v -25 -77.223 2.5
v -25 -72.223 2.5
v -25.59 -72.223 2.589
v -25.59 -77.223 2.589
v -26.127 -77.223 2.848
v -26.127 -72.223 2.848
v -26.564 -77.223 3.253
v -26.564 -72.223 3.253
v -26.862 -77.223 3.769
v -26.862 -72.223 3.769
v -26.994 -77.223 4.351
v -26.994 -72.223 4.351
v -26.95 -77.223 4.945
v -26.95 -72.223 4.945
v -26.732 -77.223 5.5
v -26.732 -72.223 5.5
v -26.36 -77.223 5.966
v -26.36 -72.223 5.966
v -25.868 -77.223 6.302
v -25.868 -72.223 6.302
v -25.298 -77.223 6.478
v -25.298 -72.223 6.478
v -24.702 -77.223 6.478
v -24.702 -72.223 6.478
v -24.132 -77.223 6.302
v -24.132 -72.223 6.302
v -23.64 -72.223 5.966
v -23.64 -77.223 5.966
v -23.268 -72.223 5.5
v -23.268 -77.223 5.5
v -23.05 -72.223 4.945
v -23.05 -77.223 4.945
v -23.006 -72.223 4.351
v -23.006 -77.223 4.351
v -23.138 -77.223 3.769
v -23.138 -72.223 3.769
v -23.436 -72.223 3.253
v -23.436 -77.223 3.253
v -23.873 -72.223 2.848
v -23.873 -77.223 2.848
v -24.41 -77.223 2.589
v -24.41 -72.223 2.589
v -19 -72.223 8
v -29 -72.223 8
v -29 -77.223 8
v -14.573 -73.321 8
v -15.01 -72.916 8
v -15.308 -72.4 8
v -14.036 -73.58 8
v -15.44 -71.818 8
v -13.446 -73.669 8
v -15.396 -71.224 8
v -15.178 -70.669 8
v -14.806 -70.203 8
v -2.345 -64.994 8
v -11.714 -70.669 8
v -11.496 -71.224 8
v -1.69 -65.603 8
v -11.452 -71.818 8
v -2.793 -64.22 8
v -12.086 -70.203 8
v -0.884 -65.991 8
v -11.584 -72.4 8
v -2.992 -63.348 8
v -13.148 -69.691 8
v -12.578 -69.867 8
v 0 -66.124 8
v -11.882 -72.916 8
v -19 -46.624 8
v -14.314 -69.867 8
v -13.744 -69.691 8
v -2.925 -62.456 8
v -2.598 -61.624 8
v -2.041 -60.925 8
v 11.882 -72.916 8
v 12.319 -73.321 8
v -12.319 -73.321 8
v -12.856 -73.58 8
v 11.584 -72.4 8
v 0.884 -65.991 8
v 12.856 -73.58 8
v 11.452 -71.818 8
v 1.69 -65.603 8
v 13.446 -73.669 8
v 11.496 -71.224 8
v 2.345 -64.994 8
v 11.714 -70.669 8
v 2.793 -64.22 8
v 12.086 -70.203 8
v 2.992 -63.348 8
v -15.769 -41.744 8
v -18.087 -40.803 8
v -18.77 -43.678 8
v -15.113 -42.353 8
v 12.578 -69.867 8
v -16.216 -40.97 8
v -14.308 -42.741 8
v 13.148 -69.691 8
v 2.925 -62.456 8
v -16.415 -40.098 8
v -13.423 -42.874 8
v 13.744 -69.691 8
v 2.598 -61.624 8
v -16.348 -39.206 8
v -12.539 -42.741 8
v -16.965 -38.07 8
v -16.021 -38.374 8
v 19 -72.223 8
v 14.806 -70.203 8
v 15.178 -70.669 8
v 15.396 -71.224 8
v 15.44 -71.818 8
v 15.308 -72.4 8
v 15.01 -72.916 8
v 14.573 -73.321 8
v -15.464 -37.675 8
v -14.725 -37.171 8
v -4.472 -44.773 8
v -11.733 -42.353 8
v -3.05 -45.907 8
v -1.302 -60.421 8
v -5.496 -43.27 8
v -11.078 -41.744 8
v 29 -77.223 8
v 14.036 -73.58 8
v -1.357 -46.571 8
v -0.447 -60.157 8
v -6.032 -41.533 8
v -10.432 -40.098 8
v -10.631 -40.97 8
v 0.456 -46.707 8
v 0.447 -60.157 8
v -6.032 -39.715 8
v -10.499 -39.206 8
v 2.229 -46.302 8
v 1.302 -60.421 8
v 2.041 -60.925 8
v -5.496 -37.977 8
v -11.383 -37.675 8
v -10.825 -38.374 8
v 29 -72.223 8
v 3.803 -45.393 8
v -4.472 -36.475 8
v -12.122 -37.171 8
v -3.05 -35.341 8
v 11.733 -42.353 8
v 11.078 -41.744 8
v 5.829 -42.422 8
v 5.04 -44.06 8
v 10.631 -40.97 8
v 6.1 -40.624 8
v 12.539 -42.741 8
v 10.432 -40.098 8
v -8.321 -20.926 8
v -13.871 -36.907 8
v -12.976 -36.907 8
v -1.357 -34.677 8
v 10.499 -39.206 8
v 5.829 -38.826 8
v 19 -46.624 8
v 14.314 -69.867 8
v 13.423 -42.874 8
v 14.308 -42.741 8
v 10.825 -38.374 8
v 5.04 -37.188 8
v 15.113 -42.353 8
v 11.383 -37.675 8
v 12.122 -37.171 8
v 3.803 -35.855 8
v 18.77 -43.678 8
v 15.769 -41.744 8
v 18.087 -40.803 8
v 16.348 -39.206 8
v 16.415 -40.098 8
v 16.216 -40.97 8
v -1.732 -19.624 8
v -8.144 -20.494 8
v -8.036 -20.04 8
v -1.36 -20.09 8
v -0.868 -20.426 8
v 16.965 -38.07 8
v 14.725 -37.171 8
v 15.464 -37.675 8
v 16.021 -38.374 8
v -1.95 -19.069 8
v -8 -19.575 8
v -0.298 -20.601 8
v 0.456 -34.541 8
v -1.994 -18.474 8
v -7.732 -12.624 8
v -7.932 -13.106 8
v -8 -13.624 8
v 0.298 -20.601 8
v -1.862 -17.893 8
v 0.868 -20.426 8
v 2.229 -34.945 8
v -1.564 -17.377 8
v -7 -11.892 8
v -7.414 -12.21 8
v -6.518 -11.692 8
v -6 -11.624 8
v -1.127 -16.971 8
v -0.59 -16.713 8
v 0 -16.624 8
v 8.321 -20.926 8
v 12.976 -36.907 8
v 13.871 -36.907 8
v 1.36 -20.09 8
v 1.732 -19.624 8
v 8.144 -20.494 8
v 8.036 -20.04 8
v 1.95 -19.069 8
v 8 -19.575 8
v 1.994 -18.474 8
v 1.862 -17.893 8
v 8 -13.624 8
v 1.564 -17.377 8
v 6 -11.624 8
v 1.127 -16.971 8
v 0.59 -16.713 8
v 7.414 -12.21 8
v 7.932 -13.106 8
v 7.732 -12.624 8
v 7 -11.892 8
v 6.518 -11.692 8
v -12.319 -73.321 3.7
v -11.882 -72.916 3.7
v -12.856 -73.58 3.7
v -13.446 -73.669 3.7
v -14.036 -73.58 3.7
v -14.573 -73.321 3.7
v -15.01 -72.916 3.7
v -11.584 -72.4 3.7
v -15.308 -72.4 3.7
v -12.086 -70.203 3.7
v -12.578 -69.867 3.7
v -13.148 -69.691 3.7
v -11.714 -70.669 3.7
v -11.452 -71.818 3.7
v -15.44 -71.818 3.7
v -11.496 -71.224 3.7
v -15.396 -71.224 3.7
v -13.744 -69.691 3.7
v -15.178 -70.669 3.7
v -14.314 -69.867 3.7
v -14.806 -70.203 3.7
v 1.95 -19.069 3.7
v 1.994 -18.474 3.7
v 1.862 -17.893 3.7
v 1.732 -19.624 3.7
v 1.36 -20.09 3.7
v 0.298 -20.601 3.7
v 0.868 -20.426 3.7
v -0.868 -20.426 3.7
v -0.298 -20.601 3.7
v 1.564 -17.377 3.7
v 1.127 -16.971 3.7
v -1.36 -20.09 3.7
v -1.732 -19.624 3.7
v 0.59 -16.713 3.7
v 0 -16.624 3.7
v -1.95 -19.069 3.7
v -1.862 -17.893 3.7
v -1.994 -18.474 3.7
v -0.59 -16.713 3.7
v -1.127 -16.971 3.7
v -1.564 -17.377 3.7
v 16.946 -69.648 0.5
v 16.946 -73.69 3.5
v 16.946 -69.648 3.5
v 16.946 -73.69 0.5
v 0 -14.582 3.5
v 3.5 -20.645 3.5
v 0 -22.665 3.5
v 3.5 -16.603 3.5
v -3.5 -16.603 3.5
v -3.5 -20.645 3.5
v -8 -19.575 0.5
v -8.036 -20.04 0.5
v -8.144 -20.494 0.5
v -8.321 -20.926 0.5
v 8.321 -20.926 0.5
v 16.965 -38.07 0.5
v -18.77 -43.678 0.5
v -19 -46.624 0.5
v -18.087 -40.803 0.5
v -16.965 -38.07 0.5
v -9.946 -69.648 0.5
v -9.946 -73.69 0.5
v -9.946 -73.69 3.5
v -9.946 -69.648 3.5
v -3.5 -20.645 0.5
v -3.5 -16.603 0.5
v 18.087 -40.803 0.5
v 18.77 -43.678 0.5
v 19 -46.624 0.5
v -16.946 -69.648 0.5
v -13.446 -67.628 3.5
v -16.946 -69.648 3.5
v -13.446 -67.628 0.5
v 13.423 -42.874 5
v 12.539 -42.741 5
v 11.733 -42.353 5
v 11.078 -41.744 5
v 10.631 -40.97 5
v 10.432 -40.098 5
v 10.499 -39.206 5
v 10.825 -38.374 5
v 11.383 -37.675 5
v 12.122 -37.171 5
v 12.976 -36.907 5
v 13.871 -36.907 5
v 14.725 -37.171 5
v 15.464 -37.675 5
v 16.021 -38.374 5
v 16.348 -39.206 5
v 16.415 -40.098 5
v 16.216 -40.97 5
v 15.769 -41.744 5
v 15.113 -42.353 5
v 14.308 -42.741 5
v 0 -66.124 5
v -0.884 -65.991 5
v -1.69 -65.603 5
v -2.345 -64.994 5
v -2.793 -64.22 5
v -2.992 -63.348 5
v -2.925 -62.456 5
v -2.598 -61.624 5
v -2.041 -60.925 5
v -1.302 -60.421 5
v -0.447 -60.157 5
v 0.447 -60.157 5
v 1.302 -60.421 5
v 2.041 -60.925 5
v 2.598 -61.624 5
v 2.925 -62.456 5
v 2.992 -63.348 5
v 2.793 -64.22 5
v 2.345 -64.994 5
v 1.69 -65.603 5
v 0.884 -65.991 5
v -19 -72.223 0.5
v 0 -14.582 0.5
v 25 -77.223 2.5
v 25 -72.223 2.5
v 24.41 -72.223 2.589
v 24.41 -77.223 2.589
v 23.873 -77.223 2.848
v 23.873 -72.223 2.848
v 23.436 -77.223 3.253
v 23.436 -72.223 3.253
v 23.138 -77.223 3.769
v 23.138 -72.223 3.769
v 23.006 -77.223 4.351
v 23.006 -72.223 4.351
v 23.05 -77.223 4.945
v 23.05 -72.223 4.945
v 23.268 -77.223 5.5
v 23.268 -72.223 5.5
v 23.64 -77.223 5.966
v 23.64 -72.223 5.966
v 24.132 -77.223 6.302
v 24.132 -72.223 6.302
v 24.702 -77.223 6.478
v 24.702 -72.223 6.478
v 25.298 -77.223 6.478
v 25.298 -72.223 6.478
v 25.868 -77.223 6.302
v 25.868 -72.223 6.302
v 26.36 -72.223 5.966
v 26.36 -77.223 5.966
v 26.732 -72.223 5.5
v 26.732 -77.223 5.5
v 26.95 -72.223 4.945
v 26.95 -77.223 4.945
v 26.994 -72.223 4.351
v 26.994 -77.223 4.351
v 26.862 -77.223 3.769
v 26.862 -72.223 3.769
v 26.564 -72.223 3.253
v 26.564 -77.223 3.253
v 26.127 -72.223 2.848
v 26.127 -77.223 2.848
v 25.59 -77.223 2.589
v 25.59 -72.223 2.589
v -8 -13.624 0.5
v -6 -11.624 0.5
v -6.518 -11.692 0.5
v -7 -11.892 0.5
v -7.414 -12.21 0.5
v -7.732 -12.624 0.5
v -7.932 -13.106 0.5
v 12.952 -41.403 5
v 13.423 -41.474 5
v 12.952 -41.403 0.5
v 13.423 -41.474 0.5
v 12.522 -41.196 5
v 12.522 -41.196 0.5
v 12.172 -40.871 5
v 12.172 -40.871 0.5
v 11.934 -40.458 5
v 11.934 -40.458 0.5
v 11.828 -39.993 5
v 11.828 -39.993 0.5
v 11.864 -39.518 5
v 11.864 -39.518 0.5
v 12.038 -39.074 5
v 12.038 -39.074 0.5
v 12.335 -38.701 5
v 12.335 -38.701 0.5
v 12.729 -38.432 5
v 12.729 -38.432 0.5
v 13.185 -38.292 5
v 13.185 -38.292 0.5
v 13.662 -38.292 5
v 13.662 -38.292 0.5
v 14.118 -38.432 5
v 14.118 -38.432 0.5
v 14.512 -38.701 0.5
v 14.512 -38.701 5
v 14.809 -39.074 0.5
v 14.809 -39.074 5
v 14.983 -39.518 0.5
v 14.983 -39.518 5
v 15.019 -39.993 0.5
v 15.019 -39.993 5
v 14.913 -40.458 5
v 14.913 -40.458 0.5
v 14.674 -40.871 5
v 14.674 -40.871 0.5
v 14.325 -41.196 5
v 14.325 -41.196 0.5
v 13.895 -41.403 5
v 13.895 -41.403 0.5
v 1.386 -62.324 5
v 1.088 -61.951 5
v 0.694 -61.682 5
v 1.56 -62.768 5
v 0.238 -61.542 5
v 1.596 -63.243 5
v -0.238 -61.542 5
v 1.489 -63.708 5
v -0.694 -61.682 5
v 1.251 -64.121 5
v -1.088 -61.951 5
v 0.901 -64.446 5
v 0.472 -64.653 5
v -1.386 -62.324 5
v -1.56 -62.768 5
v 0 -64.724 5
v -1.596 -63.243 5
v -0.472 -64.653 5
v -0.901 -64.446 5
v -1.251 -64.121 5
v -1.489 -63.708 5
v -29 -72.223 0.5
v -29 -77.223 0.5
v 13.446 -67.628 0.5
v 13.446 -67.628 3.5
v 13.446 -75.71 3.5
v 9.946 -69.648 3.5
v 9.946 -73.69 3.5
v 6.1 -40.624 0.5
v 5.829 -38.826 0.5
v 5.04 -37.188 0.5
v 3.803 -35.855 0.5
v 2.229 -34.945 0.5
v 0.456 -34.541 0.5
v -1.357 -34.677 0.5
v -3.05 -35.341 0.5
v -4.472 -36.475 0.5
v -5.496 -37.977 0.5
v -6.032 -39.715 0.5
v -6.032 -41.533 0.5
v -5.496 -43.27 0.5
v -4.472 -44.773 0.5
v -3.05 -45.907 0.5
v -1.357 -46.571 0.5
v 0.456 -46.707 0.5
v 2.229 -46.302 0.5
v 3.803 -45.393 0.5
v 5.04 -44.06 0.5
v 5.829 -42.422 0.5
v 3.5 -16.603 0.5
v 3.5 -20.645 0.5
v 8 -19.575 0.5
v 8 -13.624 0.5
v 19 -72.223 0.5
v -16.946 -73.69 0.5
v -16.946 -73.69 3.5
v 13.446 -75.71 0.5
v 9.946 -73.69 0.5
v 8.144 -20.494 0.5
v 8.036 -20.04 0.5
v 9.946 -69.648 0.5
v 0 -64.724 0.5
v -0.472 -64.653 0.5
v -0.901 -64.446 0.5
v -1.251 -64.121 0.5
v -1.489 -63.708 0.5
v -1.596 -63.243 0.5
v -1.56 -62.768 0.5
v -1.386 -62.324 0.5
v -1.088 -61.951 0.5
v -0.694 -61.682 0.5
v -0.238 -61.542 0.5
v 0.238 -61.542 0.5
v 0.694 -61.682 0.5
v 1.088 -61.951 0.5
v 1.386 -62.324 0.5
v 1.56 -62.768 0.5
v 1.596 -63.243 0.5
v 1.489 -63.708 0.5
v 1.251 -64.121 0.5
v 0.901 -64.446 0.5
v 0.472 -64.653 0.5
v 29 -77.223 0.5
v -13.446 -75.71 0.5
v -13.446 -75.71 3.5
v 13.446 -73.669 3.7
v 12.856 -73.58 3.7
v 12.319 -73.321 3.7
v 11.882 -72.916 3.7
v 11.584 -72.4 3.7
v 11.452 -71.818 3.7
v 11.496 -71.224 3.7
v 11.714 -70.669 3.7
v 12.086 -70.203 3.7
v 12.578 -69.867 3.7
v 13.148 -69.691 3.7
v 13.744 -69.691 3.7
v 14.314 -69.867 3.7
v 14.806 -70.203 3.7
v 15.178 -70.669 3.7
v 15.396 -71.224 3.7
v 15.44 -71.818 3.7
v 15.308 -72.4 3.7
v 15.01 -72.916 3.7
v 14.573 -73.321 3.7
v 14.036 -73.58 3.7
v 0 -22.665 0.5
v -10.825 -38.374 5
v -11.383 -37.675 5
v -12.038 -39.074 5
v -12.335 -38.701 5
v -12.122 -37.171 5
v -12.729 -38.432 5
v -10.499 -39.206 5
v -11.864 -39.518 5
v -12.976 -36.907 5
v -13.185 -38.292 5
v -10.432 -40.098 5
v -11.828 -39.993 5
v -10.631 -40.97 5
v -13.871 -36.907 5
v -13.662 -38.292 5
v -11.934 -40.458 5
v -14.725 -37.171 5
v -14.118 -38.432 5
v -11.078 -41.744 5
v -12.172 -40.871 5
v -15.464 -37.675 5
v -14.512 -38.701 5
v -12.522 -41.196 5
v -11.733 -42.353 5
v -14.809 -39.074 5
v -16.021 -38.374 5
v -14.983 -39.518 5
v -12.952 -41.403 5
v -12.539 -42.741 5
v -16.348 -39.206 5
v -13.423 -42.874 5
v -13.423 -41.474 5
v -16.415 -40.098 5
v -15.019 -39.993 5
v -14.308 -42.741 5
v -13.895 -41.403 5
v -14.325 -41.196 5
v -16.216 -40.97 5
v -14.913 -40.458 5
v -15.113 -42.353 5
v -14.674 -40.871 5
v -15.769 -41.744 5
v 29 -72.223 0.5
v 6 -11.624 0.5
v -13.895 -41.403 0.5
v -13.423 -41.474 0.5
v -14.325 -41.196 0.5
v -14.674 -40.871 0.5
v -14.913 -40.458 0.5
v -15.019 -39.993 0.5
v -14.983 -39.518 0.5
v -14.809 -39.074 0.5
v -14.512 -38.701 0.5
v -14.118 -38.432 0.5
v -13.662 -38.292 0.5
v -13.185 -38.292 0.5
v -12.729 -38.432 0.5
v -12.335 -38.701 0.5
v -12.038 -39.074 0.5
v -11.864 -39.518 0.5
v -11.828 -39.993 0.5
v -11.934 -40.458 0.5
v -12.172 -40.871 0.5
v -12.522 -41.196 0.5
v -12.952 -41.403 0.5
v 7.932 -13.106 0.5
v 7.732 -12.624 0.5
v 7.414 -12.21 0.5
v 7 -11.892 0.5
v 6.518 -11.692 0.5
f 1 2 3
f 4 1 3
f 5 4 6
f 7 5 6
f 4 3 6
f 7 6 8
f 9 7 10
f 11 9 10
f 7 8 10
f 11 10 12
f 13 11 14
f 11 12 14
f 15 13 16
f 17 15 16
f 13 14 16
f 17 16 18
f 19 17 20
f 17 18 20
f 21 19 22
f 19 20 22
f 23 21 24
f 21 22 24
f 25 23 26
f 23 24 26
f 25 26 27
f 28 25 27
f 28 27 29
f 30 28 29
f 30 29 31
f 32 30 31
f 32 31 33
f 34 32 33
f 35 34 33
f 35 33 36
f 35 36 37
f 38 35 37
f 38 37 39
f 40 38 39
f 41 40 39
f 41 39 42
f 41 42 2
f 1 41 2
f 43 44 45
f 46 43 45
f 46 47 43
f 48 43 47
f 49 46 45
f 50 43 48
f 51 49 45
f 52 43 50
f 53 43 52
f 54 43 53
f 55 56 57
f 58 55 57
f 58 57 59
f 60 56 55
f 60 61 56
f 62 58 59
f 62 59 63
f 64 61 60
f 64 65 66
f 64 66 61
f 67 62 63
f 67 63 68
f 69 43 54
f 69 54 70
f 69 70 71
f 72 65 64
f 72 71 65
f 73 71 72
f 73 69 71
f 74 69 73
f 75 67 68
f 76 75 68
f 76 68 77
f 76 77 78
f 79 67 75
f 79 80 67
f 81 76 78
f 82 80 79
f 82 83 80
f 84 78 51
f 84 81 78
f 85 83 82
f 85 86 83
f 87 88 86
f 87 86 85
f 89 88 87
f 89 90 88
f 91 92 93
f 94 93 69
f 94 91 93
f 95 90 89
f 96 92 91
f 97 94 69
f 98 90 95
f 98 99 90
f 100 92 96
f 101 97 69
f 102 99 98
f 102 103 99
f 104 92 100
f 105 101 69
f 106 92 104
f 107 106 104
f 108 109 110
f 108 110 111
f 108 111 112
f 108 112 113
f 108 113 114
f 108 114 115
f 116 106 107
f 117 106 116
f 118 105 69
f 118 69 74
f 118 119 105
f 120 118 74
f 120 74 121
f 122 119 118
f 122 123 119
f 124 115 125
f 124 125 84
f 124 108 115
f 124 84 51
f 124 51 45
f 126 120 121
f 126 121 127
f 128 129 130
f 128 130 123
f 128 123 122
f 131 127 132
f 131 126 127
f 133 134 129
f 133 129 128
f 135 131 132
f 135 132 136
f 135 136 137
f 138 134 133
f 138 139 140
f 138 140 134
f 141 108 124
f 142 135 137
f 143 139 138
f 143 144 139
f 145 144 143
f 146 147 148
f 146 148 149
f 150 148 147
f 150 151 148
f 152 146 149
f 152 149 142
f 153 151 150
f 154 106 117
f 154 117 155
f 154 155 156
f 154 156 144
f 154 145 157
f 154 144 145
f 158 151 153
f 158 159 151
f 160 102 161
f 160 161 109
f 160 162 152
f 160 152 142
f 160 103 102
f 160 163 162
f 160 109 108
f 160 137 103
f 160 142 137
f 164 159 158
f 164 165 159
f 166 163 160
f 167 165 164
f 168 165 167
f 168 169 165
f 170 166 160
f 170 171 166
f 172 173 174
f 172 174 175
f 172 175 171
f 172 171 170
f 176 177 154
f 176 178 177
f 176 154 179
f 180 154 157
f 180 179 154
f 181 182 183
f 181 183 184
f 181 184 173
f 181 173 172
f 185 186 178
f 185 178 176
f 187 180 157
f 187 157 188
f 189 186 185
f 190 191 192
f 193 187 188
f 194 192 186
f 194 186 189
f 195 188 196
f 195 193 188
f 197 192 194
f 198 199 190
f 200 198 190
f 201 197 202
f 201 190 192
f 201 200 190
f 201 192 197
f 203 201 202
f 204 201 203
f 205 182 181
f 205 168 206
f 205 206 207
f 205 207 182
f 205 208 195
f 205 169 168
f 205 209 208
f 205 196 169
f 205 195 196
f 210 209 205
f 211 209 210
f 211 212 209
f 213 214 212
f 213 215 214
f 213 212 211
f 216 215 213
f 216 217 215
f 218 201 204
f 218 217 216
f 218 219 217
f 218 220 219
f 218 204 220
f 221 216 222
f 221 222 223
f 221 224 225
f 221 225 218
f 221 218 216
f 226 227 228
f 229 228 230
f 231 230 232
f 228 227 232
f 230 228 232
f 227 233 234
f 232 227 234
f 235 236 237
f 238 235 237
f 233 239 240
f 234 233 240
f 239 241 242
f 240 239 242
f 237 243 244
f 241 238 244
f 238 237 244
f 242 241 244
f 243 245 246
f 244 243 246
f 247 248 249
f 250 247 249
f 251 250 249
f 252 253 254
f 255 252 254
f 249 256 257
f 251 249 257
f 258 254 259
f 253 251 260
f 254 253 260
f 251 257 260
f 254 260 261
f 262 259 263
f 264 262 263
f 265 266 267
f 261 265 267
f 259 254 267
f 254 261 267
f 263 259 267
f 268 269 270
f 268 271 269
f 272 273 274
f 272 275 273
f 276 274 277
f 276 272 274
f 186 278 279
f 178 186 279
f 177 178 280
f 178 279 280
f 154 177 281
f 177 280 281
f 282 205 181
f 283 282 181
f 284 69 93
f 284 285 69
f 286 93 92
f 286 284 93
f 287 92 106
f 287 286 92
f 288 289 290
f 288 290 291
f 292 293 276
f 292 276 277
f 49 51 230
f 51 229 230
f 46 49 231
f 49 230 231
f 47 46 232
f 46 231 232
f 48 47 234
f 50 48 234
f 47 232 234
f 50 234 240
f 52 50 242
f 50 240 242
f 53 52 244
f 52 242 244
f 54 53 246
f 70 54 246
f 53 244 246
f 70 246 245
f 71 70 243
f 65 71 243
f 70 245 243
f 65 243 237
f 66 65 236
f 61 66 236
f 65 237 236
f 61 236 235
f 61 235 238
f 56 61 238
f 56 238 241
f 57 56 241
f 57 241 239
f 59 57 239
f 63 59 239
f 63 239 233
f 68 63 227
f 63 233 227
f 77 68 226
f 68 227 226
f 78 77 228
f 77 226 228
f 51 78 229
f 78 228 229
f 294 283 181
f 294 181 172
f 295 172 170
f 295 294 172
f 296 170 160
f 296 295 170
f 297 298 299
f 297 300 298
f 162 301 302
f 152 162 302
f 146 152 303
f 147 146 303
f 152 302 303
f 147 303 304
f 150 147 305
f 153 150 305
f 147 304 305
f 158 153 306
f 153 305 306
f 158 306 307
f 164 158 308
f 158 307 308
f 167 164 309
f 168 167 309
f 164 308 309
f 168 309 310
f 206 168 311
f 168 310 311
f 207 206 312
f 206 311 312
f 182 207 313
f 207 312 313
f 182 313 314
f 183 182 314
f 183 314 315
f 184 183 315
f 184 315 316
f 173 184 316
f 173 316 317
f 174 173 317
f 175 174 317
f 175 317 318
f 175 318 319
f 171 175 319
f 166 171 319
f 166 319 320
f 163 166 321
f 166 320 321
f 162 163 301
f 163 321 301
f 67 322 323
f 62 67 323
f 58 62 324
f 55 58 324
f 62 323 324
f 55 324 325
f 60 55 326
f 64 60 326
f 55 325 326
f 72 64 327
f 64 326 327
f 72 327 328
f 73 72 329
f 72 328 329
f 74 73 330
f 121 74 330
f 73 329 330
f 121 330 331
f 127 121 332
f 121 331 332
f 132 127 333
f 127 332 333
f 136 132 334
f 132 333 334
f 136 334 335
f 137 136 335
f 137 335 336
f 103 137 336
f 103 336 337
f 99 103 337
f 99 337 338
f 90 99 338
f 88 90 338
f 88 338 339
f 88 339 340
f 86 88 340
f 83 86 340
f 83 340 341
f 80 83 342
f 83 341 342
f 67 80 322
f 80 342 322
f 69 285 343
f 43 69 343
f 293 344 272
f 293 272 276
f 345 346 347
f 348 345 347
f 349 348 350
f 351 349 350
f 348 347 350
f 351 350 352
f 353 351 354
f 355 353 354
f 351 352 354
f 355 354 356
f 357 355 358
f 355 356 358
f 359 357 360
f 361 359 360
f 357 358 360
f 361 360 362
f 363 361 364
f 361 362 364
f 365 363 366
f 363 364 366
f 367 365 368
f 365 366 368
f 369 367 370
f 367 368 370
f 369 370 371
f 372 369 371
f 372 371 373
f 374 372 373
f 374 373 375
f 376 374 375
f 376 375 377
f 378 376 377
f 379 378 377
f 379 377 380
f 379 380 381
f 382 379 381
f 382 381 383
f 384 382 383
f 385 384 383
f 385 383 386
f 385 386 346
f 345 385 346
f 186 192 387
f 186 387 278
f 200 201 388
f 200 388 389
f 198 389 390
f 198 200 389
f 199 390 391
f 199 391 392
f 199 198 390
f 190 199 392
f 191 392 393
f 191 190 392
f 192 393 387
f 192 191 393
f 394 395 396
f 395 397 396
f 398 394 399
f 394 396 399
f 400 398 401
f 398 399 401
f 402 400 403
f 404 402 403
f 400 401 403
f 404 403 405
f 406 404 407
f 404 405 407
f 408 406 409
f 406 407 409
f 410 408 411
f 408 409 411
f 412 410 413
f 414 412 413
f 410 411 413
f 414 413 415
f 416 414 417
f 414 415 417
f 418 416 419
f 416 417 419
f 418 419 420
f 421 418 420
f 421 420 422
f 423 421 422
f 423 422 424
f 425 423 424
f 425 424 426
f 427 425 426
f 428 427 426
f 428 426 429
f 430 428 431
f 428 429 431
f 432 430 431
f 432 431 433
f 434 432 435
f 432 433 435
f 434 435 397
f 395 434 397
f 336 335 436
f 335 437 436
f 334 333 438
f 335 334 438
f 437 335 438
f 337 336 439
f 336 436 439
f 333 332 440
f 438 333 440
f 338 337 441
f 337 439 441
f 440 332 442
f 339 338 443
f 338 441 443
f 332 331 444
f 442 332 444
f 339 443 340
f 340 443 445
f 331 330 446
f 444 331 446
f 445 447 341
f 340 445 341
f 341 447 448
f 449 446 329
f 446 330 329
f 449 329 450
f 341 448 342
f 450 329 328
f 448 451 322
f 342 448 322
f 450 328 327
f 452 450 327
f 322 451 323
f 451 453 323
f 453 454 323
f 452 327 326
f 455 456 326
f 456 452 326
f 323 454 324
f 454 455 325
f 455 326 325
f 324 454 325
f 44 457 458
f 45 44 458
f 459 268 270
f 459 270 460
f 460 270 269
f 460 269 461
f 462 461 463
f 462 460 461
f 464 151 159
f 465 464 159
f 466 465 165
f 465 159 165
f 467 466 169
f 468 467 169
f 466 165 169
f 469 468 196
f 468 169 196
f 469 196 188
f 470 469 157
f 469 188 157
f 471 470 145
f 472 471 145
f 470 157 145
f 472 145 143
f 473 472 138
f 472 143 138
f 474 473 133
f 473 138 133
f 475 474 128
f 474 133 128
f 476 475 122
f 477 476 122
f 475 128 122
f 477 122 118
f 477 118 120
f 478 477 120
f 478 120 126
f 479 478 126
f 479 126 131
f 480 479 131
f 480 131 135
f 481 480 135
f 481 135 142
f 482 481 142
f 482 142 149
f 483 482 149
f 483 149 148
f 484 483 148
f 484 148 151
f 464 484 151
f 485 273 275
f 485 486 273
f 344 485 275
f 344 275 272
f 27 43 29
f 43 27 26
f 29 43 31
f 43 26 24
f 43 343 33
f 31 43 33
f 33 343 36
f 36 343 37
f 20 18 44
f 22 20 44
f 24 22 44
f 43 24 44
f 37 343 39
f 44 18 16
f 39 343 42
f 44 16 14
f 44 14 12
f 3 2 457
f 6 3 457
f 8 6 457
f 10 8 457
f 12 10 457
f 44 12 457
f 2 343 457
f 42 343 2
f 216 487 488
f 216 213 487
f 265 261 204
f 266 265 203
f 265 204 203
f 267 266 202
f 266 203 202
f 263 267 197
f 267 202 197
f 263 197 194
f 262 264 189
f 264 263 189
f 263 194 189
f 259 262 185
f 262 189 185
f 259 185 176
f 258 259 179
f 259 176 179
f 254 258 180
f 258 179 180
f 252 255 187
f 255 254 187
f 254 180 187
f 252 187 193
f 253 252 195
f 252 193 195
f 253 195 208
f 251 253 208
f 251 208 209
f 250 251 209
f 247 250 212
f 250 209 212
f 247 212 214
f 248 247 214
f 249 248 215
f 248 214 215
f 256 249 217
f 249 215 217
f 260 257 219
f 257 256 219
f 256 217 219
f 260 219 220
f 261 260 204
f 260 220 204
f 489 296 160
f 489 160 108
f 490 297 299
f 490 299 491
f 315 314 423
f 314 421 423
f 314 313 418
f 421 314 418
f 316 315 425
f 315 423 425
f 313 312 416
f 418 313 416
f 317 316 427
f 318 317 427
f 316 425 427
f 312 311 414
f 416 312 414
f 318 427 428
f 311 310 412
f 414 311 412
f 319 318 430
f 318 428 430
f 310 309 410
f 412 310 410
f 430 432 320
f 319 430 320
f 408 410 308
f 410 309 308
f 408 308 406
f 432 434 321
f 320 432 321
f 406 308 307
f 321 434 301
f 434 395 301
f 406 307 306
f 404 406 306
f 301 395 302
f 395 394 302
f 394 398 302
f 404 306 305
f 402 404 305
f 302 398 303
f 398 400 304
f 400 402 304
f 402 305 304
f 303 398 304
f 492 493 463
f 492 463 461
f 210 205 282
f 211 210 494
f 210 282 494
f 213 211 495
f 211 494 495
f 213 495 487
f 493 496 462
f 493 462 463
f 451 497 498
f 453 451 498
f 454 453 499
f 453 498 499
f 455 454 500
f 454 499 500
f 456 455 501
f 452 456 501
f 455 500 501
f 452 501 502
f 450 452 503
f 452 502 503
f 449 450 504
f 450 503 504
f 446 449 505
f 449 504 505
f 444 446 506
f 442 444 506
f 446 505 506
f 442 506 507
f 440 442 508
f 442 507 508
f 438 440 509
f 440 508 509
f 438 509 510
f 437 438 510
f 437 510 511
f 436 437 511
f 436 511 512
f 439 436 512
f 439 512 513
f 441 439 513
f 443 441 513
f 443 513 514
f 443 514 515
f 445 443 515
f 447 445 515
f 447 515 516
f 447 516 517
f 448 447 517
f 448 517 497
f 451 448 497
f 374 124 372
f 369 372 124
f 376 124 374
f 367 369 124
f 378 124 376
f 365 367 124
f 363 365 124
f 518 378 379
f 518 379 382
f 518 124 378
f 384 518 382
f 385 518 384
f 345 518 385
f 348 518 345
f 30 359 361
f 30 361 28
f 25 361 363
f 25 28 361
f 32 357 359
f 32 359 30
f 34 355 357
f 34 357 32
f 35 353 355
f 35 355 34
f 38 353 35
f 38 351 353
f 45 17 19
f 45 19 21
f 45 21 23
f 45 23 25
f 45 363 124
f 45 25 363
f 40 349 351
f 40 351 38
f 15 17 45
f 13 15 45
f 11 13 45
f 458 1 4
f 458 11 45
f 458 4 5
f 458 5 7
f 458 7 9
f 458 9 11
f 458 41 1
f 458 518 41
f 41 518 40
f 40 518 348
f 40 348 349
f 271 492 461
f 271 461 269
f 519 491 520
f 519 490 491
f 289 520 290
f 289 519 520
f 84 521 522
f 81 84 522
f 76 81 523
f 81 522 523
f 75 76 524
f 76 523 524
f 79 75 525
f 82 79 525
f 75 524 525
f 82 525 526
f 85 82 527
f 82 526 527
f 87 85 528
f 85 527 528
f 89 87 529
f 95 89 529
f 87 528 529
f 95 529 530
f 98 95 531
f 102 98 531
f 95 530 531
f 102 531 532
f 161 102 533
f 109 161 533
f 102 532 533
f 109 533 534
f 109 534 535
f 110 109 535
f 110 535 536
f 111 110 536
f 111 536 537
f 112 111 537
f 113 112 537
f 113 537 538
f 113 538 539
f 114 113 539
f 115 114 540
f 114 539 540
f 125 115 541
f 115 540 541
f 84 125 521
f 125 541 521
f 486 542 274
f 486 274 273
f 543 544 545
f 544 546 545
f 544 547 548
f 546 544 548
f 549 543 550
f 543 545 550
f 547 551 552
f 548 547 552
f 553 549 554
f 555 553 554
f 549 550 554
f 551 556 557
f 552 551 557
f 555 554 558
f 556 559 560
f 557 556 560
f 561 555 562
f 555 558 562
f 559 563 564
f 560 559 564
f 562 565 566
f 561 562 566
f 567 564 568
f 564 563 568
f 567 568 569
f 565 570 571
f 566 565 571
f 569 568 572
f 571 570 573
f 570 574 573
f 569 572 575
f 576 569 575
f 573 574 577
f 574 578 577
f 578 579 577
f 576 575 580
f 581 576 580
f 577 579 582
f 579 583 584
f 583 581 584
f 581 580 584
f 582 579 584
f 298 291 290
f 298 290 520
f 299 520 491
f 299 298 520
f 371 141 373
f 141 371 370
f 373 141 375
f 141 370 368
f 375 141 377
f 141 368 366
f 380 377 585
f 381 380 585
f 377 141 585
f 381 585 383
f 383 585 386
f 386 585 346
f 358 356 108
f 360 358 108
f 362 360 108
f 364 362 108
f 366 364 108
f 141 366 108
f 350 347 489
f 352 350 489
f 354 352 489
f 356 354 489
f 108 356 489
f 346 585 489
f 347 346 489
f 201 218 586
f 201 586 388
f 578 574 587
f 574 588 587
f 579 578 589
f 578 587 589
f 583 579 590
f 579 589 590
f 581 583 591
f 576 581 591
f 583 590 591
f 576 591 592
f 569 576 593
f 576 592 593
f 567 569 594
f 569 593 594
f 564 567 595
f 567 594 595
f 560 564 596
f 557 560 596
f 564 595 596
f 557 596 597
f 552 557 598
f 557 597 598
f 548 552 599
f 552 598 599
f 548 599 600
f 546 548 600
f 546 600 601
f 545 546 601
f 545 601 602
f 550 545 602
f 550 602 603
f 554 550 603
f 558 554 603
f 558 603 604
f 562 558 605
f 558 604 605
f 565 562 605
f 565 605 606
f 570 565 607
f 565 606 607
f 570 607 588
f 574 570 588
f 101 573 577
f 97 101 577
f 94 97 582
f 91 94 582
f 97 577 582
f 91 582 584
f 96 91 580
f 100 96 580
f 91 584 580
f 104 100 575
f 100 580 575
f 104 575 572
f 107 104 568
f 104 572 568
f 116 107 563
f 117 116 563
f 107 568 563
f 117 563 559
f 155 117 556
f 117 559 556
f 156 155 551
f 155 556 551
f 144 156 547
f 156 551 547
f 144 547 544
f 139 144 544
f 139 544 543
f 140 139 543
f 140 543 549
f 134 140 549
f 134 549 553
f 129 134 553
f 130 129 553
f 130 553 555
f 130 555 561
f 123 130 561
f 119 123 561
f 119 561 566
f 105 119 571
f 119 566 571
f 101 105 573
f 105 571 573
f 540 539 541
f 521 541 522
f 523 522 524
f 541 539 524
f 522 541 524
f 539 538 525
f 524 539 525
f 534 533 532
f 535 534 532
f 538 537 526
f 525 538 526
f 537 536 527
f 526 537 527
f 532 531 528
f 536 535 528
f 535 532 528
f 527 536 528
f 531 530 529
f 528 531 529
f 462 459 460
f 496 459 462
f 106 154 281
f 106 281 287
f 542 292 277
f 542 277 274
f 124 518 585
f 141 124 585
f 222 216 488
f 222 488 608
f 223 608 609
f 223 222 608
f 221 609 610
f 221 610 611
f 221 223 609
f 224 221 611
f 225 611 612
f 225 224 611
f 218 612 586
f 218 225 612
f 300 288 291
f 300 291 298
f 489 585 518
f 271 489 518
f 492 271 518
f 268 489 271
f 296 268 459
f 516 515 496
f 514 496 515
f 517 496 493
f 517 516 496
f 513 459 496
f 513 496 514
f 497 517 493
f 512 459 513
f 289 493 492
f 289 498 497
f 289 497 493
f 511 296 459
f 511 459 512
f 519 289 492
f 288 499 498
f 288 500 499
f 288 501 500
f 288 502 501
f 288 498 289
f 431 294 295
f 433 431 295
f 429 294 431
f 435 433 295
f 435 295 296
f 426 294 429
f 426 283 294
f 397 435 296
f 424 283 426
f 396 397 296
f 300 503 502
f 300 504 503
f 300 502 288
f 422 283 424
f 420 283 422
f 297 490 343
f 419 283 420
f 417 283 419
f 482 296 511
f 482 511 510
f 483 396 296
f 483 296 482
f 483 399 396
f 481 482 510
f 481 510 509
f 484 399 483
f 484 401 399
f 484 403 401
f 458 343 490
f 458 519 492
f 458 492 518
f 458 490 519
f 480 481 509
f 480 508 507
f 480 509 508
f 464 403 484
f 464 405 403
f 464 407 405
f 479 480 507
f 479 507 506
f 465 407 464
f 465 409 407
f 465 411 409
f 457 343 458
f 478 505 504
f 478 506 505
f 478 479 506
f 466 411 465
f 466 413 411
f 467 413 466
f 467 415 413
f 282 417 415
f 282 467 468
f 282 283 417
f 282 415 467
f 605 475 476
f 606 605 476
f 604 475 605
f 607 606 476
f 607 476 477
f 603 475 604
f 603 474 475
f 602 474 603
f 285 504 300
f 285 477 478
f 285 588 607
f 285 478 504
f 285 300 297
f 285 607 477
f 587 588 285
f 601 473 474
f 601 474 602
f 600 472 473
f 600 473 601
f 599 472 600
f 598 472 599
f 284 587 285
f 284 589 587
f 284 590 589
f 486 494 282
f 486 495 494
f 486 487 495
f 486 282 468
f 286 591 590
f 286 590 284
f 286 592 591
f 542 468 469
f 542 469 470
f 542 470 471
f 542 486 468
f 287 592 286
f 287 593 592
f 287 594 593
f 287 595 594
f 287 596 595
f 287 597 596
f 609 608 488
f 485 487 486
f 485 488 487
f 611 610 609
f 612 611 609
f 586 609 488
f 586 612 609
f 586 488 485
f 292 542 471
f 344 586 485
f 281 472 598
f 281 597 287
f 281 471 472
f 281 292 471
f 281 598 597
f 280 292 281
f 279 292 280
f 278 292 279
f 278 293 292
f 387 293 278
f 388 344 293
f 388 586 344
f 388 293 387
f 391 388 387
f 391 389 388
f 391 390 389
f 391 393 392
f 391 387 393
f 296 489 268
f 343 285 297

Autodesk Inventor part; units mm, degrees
ref_plane "YZ Plane" through (0, 0, 0) normal (1, 0, 0) x (0, 1, 0)
ref_plane "XZ Plane" through (0, 0, 0) normal (0, 1, 0) x (-1, 0, 0)
ref_plane "XY Plane" through (0, 0, 0) normal (0, 0, 1) x (1, 0, 0)
sketch "Skizze1" plane through (0, 0, 0) normal (0, 0, 1) x (1, 0, 0)
  arc A0 (-19, -51.1238) -> (19, -51.1238) centre (0, -51.1238) ccw projected
  line L0 (-19, -72.2231) -> (-19, -51.1238) projected
  line L1 (-19, -72.2231) -> (-29, -72.2231) projected
  line L2 (-29, -72.2231) -> (-29, -77.2231) projected
  line L3 (29, -77.2231) -> (-29, -77.2231) projected
  line L4 (29, -77.2231) -> (29, -72.2231) projected
  line L5 (29, -72.2231) -> (19, -72.2231) projected
  line L6 (19, -72.2231) -> (19, -51.1238) projected
  circle A1 centre (0, -47.6238) radius 17.5 projected
  circle A2 centre (0, -40.6238) radius 6 projected
  arc A3 (19, -46.6238) -> (-19, -46.6238) centre (0, -46.6238) ccw
  line L7 (-19, -46.6238) -> (-19, -51.1238)
  line L8 (19, -46.6238) -> (19, -51.1238)
  circle A4 centre (-13.446, -71.669) radius 2.1 projected
  circle A5 centre (13.446, -71.669) radius 2.1 projected
  point P0 (0, 0)
extrude "Extrusion1" add sketch "Skizze1" along normal blind 8 contours L7 A3 L8 A0 | A0 L6 L5 L4 L3 L2 L1 L0 | A1 | A4 | A5
sketch "Skizze2" plane through (-29, -77.2231, 0) normal (0, -1, 0) x (1, 0, 0)
  circle A0 centre (4, 4.5) radius 2.35 projected
  circle A1 centre (54, 4.5) radius 2.35 projected
  point P0 (29, 0)
hole "Bohrung1" at (-25, -77.2231, 4.5) at (25, -77.2231, 4.5) direction (0, 1, 0) diameter 4 end through all
sketch "Skizze3" plane through (0, 0, 0) normal (0, 0, -1) x (-1, 0, 0)
  circle A0 centre (0, -40.6238) radius 6 projected
  line L0 (-19, -72.2231) -> (-19, -46.6238) projected
  line L1 (-29, -72.2231) -> (-19, -72.2231) projected
  line L2 (-29, -77.2231) -> (-29, -72.2231) projected
  line L3 (29, -77.2231) -> (-29, -77.2231) projected
  line L4 (29, -72.2231) -> (29, -77.2231) projected
  line L5 (19, -72.2231) -> (29, -72.2231) projected
  line L6 (19, -46.6238) -> (19, -72.2231) projected
  arc A1 (19, -46.6238) -> (-19, -46.6238) centre (0, -46.6238) ccw projected
  point P0 (0, 0)
extrude "Extrusion2" cut sketch "Skizze3" against normal blind 0.5
sketch "Skizze4" plane through (0, 0, 8) normal (0, 0, 1) x (1, 0, 0)
  circle A0 centre (-13.446, -71.669) radius 2.1 projected
  circle A1 centre (13.446, -71.669) radius 2.1 projected
  point P0 (0, 0)
hole "Bohrung2" at (-13.446, -71.669, 8) at (13.446, -71.669, 8) direction (0, 0, -1) diameter 4 end through all
sketch "Skizze5" plane through (0, 0, 0.5) normal (0, 0, -1) x (-1, 0, 0)
  circle A0 centre (13.446, -71.669) radius 2 projected
  circle A1 centre (-13.446, -71.669) radius 2 projected
  line L0 (-19, -72.2231) -> (-19, -46.6238) projected
  line L1 (19, -46.6238) -> (19, -72.2231) projected
  line L2 (-13.446, -67.6276) -> (-9.946, -69.6483)
  line L3 (-9.946, -69.6483) -> (-9.946, -73.6898)
  line L4 (-9.946, -73.6898) -> (-13.446, -75.7105)
  line L5 (-13.446, -75.7105) -> (-16.946, -73.6898)
  line L6 (-16.946, -73.6898) -> (-16.946, -69.6483)
  line L7 (-16.946, -69.6483) -> (-13.446, -67.6276)
  line L8 (13.446, -67.6276) -> (16.946, -69.6483)
  line L9 (16.946, -69.6483) -> (16.946, -73.6898)
  line L10 (16.946, -73.6898) -> (13.446, -75.7105)
  line L11 (13.446, -75.7105) -> (9.946, -73.6898)
  line L12 (9.946, -73.6898) -> (9.946, -69.6483)
  line L13 (9.946, -69.6483) -> (13.446, -67.6276)
  point P0 (0, 0)
  dimension "d18" = 7
extrude "Extrusion3" cut sketch "Skizze5" against normal blind 3 contours A0 | A1 | L2 L3 L4 L5 L6 L7 | L8 L9 L10 L11 L12 L13
sketch "Skizze8" plane through (0, 0, 8) normal (0, 0, 1) x (1, 0, 0)
  circle A0 centre (0, -40.6238) radius 6 projected
  line L0 (-29, -77.2231) -> (29, -77.2231) projected
  circle A1 centre (0, -47.6238) radius 15.5 construction
  line L1 (0, -40.6238) -> (0, -77.2231) construction
  line L2 (-13.4234, -39.8738) -> (0, -47.6238) construction
  line L3 (0, -47.6238) -> (13.4234, -39.8738) construction
  line L4 (0, -47.6238) -> (0, -32.1238) construction
  point P0 (0, 0)
  point P1 (0, -63.1238)
  dimension "d21" = 31
  dimension "d22" = 7
  dimension "d23" = 60
hole "Bohrung3" at (-13.4234, -39.8738, 8) at (13.4234, -39.8738, 8) at (0, -63.1238, 8) direction (0, 0, -1) diameter 3.2 end through all counterbore diameter 6 counterbore depth 3
sketch "Skizze9" plane through (0, 0, 8) normal (0, 0, 1) x (1, 0, 0)
  circle A0 centre (0, -40.6238) radius 6 projected
  circle A1 centre (0, -40.6238) radius 6.1
  point P0 (0, 0)
  dimension "d31" = 12.2
extrude "Extrusion4" cut sketch "Skizze9" against normal through all contours A0 | A1
sketch "Skizze10" plane through (0, 0, 3.5) normal (0, 0, -1) x (-1, 0, 0)
  circle A0 centre (13.446, -71.669) radius 2 projected
  circle A1 centre (-13.446, -71.669) radius 2 projected
  circle A2 centre (-13.446, -71.669) radius 2 projected
  line L0 (-13.446, -67.6276) -> (-9.946, -69.6483) projected
  line L1 (-16.946, -69.6483) -> (-13.446, -67.6276) projected
  line L2 (-16.946, -73.6898) -> (-16.946, -69.6483) projected
  line L3 (-13.446, -75.7105) -> (-16.946, -73.6898) projected
  line L4 (-9.946, -73.6898) -> (-13.446, -75.7105) projected
  line L5 (-9.946, -69.6483) -> (-9.946, -73.6898) projected
  point P0 (0, 0)
extrude "Extrusion5" add sketch "Skizze10" against normal blind 0.2 contours A0 | A1
sketch "Skizze11" plane through (0, 0, 8) normal (0, 0, 1) x (1, 0, 0)
  circle A0 centre (0, -63.1238) radius 3 projected
  arc A1 (19, -46.6238) -> (-19, -46.6238) centre (0, -46.6238) ccw projected
  arc A2 (15, -16.1238) -> (15, -21.1238) centre (15, -18.6238) ccw construction
  line L0 (15, -16.1238) -> (23, -16.1238) construction
  arc A3 (23, -21.1238) -> (23, -16.1238) centre (23, -18.6238) ccw construction
  line L1 (23, -21.1238) -> (15, -21.1238) construction
  arc A4 (-23, -16.1238) -> (-23, -21.1238) centre (-23, -18.6238) ccw construction
  line L2 (-23, -16.1238) -> (-15, -16.1238) construction
  arc A5 (-15, -21.1238) -> (-15, -16.1238) centre (-15, -18.6238) ccw construction
  line L3 (-15, -21.1238) -> (-23, -21.1238) construction
  line L4 (23, -25.6238) -> (-23, -25.6238) construction
  arc A6 (23, -25.6238) -> (23, -11.6238) centre (23, -18.6238) ccw construction
  line L5 (-23, -11.6238) -> (23, -11.6238) construction
  arc A7 (-23, -11.6238) -> (-23, -25.6238) centre (-23, -18.6238) ccw construction
  line L6 (-8, -29.3901) -> (8, -29.3901)
  line L7 (8, -29.3901) -> (8, -13.6238)
  line L8 (6, -11.6238) -> (-6, -11.6238)
  line L9 (-8, -13.6238) -> (-8, -29.3901)
  line L10 (0, -63.1238) -> (0, -11.6238) construction
  circle A8 centre (-15, -18.6238) radius 7 construction
  arc A9 (-6, -11.6238) -> (-8, -13.6238) centre (-6, -13.6238) ccw
  arc A10 (8, -13.6238) -> (6, -11.6238) centre (6, -13.6238) ccw
  line L11 (-8, -20.2888) -> (-16.9654, -38.0696)
  line L12 (8, -20.2888) -> (16.9654, -38.0696)
  circle A11 centre (0, -18.6238) radius 2 projected
  point P0 (0, 0)
  point P1 (8, -11.6238)
  dimension "d36" = 2
extrude "Extrusion6" add sketch "Skizze11" against normal up to surface (7.5 mm away) contours A1 L7 L12 | A1 L9 A9 L8 A10 L7 | A1 L11 L9 | A11
fillet "Rundung1" radius 3 2 edges at (-8, -20.2888, 4.25) (8, -20.2888, 4.25)
sketch "Skizze12" plane through (0, 0, 0.5) normal (0, 0, -1) x (-1, 0, 0)
  circle A0 centre (0, -63.1238) radius 1.6 projected
  line L0 (6, -11.6238) -> (-6, -11.6238) projected
  line L1 (-8, -13.6238) -> (-8, -19.5752) projected
  arc A1 (-23, -16.1238) -> (-23, -21.1238) centre (-23, -18.6238) ccw projected
  arc A2 (23, -21.1238) -> (23, -16.1238) centre (23, -18.6238) ccw projected
  line L2 (-23, -18.6238) -> (23, -18.6238) construction
  line L3 (0, -11.6238) -> (0, -63.1238) construction
  point P0 (0, 0)
  point P1 (0, -18.6238)
hole "Bohrung4" at (0, -18.6238, 0.5) direction (0, 0, 1) diameter 4 end through all
sketch "Skizze13" plane through (0, 0, 0.5) normal (0, 0, -1) x (-1, 0, 0)
  circle A0 centre (0, -18.6238) radius 2 projected
  line L0 (-8, -13.6238) -> (-8, -19.5752) projected
  line L1 (0, -14.5824) -> (3.5, -16.6031)
  line L2 (3.5, -16.6031) -> (3.5, -20.6446)
  line L3 (3.5, -20.6446) -> (0, -22.6653)
  line L4 (0, -22.6653) -> (-3.5, -20.6446)
  line L5 (-3.5, -20.6446) -> (-3.5, -16.6031)
  line L6 (-3.5, -16.6031) -> (0, -14.5824)
  point P0 (0, 0)
  dimension "d47" = 7
extrude "Extrusion7" cut sketch "Skizze13" against normal blind 3 contours A0 | L1 L2 L3 L4 L5 L6
sketch "Skizze14" plane through (0, 0, 3.5) normal (0, 0, -1) x (-1, 0, 0)
  circle A0 centre (0, -18.6238) radius 2 projected
  point P0 (0, 0)
extrude "Extrusion8" add sketch "Skizze14" against normal blind 0.2
properties part number "EllbowMotorMount" material "ABS-Kunststoff - Schwarz"
